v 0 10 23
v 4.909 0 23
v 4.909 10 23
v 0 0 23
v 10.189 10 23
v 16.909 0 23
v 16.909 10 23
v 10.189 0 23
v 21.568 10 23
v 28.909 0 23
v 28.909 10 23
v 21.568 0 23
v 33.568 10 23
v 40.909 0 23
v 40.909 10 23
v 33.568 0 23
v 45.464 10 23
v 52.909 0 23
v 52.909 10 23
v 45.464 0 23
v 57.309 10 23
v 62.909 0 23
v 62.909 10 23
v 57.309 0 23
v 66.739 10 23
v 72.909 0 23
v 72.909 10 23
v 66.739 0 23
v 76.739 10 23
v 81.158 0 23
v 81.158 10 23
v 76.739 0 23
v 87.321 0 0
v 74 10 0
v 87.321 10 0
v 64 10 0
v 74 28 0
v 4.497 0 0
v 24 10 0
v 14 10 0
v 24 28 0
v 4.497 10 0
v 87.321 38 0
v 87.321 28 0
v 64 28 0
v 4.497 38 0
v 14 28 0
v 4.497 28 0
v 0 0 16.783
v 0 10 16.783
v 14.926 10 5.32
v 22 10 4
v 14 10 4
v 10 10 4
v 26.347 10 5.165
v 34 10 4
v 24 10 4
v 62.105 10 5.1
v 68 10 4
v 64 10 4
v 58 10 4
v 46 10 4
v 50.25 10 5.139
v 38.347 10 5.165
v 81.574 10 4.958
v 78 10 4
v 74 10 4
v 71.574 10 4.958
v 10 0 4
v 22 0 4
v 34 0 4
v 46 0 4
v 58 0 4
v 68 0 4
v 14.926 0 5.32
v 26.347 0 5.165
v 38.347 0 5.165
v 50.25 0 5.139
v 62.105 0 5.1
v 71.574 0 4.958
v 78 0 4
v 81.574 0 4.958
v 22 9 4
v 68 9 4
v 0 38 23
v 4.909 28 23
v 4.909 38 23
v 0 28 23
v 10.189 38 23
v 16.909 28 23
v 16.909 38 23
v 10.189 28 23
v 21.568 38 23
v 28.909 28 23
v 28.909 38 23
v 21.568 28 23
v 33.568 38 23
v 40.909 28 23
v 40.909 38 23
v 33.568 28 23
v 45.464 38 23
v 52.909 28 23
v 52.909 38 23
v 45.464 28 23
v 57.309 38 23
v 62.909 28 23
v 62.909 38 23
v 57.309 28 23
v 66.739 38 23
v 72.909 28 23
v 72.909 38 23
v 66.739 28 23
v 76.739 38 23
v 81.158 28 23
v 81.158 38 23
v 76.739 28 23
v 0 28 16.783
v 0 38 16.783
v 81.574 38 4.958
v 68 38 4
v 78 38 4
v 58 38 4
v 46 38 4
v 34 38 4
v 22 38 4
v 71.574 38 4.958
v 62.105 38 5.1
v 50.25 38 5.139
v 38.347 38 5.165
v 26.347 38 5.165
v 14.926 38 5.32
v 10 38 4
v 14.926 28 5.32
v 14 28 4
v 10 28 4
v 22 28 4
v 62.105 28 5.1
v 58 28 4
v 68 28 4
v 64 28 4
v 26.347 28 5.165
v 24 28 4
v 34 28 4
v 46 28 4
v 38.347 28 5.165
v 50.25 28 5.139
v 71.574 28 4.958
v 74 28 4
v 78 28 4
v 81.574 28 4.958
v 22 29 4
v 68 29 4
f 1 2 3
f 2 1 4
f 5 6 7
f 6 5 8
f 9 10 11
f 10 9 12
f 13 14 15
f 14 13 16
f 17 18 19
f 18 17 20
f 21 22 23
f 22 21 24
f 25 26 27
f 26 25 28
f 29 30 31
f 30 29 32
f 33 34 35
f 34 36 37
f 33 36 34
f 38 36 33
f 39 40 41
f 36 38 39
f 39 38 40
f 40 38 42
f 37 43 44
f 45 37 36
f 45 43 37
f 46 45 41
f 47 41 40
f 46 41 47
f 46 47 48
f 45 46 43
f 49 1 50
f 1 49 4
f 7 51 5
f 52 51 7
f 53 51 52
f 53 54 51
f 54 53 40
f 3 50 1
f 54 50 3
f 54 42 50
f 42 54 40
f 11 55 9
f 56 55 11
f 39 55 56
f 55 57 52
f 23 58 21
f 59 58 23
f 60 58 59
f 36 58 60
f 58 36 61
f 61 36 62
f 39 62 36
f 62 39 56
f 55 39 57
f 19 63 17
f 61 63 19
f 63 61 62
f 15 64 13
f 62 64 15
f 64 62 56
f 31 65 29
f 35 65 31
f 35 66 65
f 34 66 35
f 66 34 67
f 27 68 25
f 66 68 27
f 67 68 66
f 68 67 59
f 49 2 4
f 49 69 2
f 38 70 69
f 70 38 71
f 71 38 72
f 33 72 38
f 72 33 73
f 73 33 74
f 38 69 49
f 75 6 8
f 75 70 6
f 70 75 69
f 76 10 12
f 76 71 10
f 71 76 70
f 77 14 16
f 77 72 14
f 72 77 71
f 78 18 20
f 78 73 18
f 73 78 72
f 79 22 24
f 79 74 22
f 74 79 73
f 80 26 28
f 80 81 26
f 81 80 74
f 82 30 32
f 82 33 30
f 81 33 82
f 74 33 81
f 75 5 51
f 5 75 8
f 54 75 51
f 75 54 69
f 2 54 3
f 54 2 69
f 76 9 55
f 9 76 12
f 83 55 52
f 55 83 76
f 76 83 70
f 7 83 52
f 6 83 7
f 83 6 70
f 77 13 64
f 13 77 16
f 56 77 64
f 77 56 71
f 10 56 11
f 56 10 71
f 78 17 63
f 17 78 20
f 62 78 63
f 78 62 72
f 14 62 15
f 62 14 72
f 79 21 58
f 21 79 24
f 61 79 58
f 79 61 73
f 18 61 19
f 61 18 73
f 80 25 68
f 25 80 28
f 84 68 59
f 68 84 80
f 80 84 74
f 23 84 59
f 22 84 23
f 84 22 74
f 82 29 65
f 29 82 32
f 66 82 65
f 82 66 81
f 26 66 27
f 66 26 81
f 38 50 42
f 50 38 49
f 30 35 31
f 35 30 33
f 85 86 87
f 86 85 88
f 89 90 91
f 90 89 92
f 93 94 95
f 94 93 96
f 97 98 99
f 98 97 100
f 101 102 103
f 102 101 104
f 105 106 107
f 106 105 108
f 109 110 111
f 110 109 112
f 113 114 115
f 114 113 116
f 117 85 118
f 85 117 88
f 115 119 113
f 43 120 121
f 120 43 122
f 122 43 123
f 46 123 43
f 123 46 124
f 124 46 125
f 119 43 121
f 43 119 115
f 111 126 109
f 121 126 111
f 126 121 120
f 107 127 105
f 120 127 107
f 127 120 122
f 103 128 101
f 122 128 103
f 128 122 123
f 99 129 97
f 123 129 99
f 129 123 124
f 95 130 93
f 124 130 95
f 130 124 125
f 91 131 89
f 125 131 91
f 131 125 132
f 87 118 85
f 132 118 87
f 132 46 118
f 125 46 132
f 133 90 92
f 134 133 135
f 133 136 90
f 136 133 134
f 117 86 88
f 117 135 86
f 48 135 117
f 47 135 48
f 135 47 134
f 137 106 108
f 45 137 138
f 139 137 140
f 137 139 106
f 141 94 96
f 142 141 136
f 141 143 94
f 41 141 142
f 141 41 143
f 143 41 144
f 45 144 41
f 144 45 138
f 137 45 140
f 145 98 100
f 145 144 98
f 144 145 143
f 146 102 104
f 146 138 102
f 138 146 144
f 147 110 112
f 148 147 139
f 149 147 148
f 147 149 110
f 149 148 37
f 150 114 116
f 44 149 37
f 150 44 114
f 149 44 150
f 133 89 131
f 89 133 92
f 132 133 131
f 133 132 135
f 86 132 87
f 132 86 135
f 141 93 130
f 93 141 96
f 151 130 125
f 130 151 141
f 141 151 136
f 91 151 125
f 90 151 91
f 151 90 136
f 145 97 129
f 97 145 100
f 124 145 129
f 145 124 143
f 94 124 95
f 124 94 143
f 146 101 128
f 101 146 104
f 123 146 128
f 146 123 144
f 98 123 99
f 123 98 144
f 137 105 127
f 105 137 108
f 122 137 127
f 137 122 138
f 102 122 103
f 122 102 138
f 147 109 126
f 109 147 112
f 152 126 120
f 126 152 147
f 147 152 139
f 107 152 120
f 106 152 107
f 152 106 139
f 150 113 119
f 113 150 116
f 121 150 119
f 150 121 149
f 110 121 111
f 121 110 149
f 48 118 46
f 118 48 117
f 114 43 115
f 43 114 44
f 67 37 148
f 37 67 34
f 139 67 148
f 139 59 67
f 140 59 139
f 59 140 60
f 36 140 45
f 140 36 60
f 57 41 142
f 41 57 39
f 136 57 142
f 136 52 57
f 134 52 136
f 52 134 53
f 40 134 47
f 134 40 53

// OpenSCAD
module wrench_org_mm_longs(){
	difference()
	{
		cube([120,10,23]);
		
		translate([10,-1,4]) rotate([0,-15,0]) cube([5.4,12,20]);
		translate([22,-1,4]) rotate([0,-15,0]) cube([5.8,12,20]);
		translate([34,-1,4]) rotate([0,-15,0]) cube([4.7,12,20]);
		translate([46,-1,4]) rotate([0,-15,0]) cube([4.6,12,20]);
		translate([58,-1,4]) rotate([0,-15,0]) cube([3.75,12,20]);
		translate([68,-1,4]) rotate([0,-15,0]) cube([3.5,12,20]);
		translate([78,-1,4]) rotate([0,-15,0]) cube([3.3,12,20]);
		translate([88,-1,4]) rotate([0,-15,0]) cube([3.25,12,20]);
		translate([98,-1,4]) rotate([0,-15,0]) cube([2.9,12,20]);
		translate([106,-1,4]) rotate([0,-15,0]) cube([2.9,12,20]);
		translate([112,-1,4]) rotate([0,-15,0]) cube([2.8,12,20]);
     //end cuts
		translate([2,-1,-10]) rotate([0,-15,0]) cube([5,12,50]);
		translate([122,-1,-10]) rotate([0,-15,0]) cube([7,12,50]);
	}
}

module wrench_org_mm_shorts(){
	difference()
	{
		cube([88,10,23]);
		
		translate([10,-1,4]) rotate([0,-15,0]) cube([5.1,12,20]);
		translate([22,-1,4]) rotate([0,-15,0]) cube([4.5,12,20]);
		translate([34,-1,4]) rotate([0,-15,0]) cube([4.5,12,20]);
		translate([46,-1,4]) rotate([0,-15,0]) cube([4.4,12,20]);
		translate([58,-1,4]) rotate([0,-15,0]) cube([4.25,12,20]);
		translate([68,-1,4]) rotate([0,-15,0]) cube([3.7,12,20]);
		translate([78,-1,4]) rotate([0,-15,0]) cube([3.7,12,20]);

	  //end cuts
		translate([2,-1,-10]) rotate([0,-15,0]) cube([5,12,50]);
		translate([90,-1,-10]) rotate([0,-15,0]) cube([7,12,50]);
	}
}
//wrench_org_in_shorts();
//translate([64,9,0]) cube([10,20,4]);
//translate([14,9,0]) cube([10,20,4]);
//translate([0,28,0]) wrench_org_in_shorts();

//wrench_org_in_longs();
//translate([84,9,0]) cube([10,40,4]);
//translate([14,9,0]) cube([10,40,4]);
//translate([0,48,0]) wrench_org_in_longs();

translate([0,0,0]) wrench_org_mm_shorts();
translate([64,9,0]) cube([10,20,4]);
translate([14,9,0]) cube([10,20,4]);
translate([0,28,0]) wrench_org_mm_shorts();

//translate([0,0,0]) wrench_org_mm_shorts();
//translate([84,9,0]) cube([10,40,4]);
//translate([14,9,0]) cube([10,40,4]);
//translate([0,48,0]) wrench_org_mm_longs();
